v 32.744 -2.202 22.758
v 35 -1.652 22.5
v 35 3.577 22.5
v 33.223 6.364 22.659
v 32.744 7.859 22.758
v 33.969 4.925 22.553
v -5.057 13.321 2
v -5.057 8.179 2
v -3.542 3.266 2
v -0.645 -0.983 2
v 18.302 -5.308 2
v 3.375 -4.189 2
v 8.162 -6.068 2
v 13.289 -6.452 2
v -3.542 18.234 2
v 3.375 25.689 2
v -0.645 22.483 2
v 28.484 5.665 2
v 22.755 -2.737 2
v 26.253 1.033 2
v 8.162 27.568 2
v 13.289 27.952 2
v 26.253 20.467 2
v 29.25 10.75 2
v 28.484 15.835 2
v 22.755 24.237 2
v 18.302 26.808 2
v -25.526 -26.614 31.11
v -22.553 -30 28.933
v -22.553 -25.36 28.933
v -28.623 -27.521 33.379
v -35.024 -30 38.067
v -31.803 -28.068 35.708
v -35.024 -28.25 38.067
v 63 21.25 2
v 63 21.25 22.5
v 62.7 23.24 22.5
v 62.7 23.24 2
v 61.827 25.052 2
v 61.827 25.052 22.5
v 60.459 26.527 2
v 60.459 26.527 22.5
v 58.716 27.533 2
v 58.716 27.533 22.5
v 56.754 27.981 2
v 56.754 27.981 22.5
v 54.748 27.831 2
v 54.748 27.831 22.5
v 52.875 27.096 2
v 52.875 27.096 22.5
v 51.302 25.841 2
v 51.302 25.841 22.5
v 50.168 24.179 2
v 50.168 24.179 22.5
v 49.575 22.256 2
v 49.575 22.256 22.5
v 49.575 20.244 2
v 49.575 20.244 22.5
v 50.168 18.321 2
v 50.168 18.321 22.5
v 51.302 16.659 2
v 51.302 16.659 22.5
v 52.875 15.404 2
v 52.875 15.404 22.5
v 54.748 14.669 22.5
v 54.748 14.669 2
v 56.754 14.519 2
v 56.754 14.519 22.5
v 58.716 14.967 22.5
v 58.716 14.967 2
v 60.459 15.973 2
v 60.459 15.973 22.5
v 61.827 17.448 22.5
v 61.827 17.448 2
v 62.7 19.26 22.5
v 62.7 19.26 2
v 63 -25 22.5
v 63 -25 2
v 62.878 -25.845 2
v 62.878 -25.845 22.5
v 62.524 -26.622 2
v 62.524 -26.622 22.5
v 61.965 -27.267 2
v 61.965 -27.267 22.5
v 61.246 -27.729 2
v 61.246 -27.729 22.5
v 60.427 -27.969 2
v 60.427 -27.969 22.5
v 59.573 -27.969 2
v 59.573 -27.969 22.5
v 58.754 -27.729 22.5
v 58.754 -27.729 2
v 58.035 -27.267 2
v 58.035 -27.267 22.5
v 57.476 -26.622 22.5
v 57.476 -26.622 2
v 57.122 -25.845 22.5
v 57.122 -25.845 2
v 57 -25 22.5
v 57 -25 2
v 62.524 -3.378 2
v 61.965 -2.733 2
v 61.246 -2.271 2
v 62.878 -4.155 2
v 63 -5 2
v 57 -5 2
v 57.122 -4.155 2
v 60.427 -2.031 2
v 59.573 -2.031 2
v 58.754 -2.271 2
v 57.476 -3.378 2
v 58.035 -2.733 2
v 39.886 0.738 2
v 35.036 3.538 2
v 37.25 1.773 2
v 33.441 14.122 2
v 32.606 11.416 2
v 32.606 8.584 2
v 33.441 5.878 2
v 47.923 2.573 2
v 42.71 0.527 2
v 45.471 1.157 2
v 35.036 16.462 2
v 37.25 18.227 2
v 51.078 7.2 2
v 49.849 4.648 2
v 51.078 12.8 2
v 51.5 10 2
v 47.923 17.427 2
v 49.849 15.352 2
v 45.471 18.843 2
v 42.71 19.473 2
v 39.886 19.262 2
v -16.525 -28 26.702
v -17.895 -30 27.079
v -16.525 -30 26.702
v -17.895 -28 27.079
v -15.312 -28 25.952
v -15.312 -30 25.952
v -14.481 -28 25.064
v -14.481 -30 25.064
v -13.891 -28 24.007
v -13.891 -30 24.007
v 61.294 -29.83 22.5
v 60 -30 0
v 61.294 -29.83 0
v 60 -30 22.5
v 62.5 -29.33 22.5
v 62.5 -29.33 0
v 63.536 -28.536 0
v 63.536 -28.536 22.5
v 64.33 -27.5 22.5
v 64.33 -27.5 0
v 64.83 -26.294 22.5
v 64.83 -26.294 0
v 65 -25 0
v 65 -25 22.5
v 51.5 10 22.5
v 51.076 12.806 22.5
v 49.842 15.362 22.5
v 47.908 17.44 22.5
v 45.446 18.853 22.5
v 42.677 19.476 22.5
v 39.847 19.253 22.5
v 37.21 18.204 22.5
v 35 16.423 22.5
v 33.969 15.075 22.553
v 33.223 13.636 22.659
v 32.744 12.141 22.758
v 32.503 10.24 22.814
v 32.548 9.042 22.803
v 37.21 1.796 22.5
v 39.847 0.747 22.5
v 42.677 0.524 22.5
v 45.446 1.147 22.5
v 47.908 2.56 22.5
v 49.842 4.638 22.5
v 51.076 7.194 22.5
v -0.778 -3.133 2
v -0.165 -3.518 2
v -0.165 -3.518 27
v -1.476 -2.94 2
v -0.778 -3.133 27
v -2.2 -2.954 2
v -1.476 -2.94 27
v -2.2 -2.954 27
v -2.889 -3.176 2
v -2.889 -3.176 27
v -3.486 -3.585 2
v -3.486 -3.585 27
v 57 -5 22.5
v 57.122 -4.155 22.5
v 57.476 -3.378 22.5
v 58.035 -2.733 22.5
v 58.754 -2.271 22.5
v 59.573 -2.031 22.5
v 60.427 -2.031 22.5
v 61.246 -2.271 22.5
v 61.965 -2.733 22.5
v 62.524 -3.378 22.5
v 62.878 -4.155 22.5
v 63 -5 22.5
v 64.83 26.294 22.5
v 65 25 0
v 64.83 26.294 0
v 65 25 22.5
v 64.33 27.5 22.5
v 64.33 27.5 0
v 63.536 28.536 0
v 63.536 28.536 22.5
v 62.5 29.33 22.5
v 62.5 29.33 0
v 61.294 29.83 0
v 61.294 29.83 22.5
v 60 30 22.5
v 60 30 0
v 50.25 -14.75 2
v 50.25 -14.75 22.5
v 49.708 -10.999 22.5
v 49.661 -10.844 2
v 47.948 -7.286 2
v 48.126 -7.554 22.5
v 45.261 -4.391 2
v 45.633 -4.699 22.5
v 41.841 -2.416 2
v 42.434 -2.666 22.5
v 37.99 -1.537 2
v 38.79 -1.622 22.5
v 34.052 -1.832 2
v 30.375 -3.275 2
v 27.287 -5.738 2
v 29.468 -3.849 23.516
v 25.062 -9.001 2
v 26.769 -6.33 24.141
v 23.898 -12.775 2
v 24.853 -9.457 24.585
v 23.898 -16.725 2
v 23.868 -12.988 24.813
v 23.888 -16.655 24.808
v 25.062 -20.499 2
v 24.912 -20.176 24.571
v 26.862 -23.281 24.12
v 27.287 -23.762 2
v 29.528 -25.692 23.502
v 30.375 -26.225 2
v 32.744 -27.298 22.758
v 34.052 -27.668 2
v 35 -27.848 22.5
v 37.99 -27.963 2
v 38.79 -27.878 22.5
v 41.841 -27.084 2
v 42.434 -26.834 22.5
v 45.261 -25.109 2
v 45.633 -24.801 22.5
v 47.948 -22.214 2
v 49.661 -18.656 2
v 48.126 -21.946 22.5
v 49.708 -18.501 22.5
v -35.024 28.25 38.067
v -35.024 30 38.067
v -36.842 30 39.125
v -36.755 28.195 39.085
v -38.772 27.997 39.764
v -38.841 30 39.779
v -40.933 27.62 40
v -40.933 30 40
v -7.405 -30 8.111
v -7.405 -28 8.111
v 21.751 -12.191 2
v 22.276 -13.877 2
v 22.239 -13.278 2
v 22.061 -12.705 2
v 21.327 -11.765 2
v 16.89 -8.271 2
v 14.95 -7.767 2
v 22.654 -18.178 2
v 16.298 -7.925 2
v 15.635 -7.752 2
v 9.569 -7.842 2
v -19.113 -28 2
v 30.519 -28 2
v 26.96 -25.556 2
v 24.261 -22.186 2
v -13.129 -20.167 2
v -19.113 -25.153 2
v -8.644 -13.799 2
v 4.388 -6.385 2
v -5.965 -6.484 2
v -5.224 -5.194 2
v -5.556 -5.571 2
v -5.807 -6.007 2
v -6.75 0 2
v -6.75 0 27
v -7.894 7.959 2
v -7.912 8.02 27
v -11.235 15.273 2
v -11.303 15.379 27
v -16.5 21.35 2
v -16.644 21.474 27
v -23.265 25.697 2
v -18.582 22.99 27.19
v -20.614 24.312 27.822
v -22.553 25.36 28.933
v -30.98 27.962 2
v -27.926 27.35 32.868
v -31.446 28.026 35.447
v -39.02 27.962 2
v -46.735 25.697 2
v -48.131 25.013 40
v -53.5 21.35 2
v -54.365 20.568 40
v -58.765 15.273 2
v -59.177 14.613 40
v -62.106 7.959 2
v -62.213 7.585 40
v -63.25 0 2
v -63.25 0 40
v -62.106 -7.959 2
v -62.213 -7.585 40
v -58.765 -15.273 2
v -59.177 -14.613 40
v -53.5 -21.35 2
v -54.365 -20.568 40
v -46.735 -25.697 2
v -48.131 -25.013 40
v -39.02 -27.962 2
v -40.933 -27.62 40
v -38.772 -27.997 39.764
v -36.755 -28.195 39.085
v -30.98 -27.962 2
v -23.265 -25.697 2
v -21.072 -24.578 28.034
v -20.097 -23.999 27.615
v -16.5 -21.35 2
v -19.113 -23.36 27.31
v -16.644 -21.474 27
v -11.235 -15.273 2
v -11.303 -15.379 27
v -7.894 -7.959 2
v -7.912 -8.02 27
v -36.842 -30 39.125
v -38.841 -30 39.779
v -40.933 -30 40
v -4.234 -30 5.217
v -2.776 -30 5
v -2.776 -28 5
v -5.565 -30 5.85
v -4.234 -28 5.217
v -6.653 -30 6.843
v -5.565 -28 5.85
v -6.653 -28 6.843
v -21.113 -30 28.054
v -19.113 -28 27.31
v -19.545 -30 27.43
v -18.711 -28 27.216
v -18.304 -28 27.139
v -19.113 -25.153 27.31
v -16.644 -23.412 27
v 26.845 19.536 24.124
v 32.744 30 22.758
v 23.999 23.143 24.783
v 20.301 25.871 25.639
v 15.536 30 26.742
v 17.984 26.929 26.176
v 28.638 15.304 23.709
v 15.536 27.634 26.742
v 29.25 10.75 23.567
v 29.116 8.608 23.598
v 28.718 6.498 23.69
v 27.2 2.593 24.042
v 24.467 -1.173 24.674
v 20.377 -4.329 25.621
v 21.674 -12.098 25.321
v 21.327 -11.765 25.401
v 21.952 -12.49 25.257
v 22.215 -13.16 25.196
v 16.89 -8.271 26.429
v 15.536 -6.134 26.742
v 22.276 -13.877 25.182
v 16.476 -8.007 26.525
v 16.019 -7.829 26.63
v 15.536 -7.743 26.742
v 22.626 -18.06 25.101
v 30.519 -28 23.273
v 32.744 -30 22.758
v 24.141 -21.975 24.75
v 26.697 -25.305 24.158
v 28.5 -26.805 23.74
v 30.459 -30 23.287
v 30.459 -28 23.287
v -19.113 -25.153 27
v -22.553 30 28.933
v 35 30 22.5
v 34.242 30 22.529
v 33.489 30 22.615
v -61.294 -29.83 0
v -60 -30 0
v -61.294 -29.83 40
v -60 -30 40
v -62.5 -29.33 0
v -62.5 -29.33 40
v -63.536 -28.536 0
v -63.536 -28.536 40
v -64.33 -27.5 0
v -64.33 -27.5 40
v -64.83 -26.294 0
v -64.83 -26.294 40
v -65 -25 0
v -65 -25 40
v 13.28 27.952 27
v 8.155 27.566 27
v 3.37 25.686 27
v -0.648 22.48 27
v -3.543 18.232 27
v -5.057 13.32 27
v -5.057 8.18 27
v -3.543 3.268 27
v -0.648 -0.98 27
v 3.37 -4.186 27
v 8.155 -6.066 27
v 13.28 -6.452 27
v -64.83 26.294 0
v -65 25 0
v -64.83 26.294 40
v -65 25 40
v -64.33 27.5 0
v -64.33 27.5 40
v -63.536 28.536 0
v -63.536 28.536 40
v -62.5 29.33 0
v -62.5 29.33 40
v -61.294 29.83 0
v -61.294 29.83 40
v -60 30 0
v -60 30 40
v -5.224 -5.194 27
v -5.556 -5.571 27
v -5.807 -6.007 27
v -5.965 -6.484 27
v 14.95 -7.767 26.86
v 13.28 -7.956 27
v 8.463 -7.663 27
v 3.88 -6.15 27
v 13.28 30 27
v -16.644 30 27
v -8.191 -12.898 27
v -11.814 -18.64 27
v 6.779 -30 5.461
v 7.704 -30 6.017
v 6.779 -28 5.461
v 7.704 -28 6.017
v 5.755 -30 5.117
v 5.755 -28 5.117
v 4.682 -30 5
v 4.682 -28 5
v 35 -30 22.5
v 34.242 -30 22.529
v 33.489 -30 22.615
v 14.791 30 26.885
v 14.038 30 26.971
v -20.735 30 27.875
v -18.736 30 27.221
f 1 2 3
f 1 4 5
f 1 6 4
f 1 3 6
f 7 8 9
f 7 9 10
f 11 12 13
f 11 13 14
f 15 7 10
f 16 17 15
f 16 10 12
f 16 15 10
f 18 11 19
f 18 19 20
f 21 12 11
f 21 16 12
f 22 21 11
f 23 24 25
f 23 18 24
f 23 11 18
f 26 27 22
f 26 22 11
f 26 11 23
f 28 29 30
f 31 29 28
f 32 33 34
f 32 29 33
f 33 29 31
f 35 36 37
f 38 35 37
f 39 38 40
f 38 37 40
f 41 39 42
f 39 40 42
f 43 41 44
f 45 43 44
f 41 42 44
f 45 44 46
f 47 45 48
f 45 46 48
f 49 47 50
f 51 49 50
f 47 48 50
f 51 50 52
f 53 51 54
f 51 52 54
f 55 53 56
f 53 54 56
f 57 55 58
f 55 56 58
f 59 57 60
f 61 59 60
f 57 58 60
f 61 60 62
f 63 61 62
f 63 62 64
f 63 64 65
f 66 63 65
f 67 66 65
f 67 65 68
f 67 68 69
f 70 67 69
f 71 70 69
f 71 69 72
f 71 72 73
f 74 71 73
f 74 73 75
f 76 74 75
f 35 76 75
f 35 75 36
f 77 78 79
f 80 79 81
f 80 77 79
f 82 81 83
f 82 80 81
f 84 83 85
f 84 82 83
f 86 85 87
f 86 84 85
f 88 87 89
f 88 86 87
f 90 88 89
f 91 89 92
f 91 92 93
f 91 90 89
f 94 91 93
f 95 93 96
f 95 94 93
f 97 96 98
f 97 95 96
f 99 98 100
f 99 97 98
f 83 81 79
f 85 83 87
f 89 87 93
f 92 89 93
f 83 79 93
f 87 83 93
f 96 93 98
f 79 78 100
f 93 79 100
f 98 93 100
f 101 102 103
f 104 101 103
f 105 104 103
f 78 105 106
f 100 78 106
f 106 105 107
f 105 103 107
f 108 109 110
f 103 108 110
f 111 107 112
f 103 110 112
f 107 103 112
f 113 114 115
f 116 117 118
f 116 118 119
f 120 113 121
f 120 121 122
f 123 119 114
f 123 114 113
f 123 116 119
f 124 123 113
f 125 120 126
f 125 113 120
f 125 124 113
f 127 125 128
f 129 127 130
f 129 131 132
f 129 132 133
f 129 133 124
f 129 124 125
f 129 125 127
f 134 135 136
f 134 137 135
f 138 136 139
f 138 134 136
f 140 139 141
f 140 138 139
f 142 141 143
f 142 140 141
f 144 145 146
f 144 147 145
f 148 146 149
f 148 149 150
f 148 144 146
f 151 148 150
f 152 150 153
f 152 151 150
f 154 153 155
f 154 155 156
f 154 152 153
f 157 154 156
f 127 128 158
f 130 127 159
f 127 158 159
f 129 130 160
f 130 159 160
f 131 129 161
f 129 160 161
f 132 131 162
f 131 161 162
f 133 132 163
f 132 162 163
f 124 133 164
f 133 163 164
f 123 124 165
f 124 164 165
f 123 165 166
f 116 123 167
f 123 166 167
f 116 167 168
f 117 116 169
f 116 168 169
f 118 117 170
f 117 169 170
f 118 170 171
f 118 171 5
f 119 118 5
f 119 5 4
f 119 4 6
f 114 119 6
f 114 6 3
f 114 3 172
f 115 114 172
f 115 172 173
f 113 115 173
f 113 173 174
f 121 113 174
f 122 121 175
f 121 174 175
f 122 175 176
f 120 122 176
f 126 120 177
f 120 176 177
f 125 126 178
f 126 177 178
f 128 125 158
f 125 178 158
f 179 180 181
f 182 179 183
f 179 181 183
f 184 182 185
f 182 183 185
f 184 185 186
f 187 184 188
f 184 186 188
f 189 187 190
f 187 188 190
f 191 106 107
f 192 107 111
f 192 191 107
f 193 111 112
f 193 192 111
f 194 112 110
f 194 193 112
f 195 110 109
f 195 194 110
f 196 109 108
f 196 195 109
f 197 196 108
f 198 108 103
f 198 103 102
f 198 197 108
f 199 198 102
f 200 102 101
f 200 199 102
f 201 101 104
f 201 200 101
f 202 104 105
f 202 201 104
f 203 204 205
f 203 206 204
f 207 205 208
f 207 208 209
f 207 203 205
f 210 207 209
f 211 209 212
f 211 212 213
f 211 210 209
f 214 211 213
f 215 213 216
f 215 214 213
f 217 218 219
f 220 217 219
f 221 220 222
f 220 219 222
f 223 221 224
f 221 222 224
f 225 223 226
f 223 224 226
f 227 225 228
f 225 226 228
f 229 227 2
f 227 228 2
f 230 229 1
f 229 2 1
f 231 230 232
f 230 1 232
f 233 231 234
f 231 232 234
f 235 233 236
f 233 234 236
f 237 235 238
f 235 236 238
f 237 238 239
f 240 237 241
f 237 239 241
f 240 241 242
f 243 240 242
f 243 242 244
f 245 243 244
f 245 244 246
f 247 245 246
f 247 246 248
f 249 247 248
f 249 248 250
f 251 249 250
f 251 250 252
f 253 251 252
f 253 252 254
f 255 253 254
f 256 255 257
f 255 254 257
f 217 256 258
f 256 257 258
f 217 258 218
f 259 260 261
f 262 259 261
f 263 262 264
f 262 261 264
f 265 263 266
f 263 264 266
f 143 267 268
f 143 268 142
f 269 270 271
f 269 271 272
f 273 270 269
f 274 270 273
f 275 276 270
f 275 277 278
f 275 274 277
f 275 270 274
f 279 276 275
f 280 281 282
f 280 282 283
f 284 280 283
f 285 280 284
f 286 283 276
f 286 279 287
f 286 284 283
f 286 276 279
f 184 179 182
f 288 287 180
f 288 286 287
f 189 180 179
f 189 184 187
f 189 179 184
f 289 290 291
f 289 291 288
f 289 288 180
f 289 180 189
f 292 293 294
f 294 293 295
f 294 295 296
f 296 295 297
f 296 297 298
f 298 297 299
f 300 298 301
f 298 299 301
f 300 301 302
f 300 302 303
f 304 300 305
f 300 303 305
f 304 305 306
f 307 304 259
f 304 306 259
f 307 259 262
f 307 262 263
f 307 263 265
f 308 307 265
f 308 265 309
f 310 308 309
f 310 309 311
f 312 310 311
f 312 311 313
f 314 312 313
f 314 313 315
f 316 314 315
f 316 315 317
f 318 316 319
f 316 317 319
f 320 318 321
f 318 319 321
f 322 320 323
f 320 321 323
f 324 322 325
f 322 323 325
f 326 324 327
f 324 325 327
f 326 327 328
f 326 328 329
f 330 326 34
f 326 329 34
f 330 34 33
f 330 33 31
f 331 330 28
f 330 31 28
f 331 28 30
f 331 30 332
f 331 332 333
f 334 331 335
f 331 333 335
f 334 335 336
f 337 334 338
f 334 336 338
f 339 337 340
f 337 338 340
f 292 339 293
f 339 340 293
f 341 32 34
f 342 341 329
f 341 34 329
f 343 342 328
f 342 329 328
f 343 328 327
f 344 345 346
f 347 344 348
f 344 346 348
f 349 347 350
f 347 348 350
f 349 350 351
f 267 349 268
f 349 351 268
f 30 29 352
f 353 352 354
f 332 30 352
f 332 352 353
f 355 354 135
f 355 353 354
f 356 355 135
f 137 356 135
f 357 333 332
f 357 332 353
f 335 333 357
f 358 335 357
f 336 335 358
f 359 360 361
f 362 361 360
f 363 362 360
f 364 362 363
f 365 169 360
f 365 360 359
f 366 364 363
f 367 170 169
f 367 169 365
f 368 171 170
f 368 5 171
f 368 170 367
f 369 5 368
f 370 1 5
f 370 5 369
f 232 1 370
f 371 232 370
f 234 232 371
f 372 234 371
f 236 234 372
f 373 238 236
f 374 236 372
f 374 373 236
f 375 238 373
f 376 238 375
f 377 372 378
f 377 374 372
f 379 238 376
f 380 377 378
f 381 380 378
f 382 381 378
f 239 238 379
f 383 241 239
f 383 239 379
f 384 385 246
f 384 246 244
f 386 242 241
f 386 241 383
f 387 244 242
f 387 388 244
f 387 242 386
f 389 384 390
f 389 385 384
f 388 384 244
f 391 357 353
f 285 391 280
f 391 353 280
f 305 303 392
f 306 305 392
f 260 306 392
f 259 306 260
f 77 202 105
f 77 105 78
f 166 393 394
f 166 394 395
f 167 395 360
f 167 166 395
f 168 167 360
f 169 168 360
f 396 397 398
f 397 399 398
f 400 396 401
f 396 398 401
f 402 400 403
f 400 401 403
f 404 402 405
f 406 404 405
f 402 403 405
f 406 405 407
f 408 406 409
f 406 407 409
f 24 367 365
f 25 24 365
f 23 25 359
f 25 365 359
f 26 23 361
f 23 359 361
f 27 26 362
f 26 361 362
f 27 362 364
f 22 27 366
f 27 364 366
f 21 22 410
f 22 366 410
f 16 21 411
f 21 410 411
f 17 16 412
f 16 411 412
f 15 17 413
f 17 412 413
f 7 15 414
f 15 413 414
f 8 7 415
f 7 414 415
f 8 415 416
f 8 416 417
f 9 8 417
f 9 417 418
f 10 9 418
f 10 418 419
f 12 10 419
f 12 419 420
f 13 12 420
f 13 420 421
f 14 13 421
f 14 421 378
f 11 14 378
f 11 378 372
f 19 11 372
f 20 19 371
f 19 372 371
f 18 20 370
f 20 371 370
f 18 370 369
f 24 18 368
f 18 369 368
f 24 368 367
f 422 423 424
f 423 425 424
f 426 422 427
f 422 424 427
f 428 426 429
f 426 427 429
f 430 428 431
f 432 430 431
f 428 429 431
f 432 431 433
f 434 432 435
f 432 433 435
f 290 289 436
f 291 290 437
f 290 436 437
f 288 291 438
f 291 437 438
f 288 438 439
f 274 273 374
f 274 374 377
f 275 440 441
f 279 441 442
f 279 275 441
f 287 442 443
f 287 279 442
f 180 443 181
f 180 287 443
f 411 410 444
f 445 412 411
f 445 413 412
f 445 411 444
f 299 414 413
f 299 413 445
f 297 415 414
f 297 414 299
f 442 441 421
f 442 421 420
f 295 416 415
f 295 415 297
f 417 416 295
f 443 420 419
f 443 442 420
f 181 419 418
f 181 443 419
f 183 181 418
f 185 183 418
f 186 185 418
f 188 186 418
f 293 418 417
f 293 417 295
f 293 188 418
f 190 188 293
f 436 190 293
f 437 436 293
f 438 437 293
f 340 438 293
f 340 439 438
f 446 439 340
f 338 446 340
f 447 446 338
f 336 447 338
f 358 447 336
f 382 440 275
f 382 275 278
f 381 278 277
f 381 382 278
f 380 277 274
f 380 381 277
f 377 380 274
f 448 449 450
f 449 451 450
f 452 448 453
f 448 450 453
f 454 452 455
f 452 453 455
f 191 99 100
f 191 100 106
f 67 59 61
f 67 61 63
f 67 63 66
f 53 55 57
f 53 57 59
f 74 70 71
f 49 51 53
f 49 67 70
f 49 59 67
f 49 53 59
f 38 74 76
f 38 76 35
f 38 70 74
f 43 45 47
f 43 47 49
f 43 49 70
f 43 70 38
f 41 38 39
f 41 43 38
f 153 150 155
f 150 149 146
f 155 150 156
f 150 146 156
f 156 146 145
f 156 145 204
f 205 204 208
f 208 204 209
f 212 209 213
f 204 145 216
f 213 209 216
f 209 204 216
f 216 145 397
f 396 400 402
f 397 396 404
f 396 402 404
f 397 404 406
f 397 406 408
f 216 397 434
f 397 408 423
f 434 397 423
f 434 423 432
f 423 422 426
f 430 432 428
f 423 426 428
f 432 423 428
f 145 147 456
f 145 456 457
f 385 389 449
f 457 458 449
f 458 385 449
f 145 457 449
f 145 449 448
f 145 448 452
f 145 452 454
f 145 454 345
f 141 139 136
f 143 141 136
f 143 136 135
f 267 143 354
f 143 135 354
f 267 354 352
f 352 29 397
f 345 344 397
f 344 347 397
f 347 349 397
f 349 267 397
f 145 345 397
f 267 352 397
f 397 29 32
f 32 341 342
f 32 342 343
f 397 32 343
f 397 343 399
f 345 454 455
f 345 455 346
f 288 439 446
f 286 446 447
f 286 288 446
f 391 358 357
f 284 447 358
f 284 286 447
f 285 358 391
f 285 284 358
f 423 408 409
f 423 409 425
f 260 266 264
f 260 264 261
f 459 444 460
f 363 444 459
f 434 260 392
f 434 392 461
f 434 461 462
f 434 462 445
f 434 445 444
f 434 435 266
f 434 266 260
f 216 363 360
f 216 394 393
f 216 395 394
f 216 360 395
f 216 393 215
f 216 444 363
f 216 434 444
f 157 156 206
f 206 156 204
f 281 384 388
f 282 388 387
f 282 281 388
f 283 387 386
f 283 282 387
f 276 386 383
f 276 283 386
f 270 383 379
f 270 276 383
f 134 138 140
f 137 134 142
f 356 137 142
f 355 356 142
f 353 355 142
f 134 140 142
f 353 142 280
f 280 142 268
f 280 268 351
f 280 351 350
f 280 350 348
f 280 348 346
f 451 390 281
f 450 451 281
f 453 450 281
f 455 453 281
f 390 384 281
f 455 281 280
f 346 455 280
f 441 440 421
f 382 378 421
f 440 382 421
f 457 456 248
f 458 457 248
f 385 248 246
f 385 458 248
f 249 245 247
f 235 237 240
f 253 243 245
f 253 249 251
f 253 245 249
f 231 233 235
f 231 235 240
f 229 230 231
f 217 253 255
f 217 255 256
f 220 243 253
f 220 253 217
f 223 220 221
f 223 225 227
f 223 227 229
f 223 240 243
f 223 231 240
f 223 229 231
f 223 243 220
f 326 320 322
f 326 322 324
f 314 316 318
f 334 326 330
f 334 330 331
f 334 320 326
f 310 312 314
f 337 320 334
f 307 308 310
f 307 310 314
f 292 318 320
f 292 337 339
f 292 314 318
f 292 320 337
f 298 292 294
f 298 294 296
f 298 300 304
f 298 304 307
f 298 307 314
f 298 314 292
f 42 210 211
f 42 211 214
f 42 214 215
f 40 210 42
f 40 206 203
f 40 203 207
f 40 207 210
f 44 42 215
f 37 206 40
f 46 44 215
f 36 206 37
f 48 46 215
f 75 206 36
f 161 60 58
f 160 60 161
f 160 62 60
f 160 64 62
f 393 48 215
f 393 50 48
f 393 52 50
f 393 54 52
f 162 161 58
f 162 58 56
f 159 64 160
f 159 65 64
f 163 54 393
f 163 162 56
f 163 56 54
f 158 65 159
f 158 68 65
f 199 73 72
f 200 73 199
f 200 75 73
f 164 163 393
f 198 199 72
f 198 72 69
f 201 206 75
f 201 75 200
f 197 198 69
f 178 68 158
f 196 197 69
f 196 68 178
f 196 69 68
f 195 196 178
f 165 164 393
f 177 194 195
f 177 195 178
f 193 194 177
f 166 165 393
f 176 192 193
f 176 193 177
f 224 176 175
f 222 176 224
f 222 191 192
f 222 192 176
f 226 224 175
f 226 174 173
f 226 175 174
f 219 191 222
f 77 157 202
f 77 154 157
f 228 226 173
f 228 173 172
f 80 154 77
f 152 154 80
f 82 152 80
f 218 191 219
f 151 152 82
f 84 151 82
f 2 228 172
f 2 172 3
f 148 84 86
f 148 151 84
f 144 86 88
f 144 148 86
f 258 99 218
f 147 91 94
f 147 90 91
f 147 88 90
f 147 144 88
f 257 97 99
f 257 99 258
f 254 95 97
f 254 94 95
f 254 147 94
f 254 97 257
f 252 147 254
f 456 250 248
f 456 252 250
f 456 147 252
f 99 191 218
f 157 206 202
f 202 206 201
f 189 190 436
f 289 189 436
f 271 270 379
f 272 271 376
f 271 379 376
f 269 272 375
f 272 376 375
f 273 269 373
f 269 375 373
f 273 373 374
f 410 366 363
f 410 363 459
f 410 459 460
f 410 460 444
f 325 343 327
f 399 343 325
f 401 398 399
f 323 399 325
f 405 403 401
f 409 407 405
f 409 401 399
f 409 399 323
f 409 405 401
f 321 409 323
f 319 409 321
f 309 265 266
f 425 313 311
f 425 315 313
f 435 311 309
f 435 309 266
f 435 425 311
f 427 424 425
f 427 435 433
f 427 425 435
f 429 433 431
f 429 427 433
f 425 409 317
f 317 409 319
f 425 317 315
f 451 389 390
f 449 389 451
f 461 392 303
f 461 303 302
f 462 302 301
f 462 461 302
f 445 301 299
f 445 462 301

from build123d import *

# Parameters (mm, degrees)
SKETCH1_W               = 60
SKETCH1_H               = 130
BOSS_EXTRUDE1_DEPTH     = 40
SKETCH2_R               = 28.25
SKETCH2_R_2             = 13.25
SKETCH2_R_3             = 17.25
SKETCH2_R_4             = 6.75
SKETCH2_R_5             = 9.5
CUT_EXTRUDE1_DEPTH      = 38
CUT_EXTRUDE9_DEPTH      = 83.006097334
CUT_EXTRUDE9_DEPTH_BACK = 83.006097334
CUT_EXTRUDE10_START     = 2
CUT_EXTRUDE10_DEPTH     = 81.006097334
CUT_EXTRUDE11_REACH     = 99.082
FILLET8_R               = 5
FILLET9_R               = 10
FILLET10_R              = 2.5
FILLET11_R              = 5


with BuildPart() as part:
    # Sketch1 → Boss-Extrude1 (new body)
    with BuildSketch(Plane(origin=(0, 0, 0), x_dir=(0, 1, 0), z_dir=(0, 0, 1))):
        Rectangle(SKETCH1_W, SKETCH1_H)
    extrude(amount=BOSS_EXTRUDE1_DEPTH)

    # Sketch2 → Cut-Extrude1 (cut)
    with BuildSketch(Plane.XY.offset(40)):
        with Locations((-35, 0)):
            Circle(SKETCH2_R)
        with Locations((37, -14.75)):
            Circle(SKETCH2_R_2)
        with Locations((12, 10.75)):
            Circle(SKETCH2_R_3)
        with Locations((56.25, 21.25)):
            Circle(SKETCH2_R_4)
        with Locations((42, 10)):
            Circle(SKETCH2_R_5)
        with BuildLine():
            Line((63, -5), (63, -25))
            ThreePointArc((63, -25), (60, -28), (57, -25))
            Line((57, -25), (57, -5))
            ThreePointArc((57, -5), (60, -2), (63, -5))
        make_face()
    extrude(amount=-CUT_EXTRUDE1_DEPTH, mode=Mode.SUBTRACT)

    # Sketch11 → Cut-Extrude9 (cut, two sides: drawn at the far end of the back side and taken through both)
    with BuildSketch(Plane(origin=(0, 0, 0), x_dir=(-1, 0, 0), z_dir=(0, 1, 0)).offset(-CUT_EXTRUDE9_DEPTH_BACK)):
        Polygon((37.662617959, 40), (-65, 40), (-65, 22.5), (-33.857500095, 22.5), (-14.42300462, 27), (19.914447088, 27), align=None)
    extrude(amount=CUT_EXTRUDE9_DEPTH + CUT_EXTRUDE9_DEPTH_BACK, mode=Mode.SUBTRACT)

    # Sketch12 → Cut-Extrude10 (cut, through all)
    with BuildSketch(Plane(origin=(0, 0, 0), x_dir=(0, 1, 0), z_dir=(0, 0, 1)).offset(CUT_EXTRUDE10_START)):
        with BuildLine():
            Line((-25.153127982, 19.113444278), (-28, 19.113444278))
            Line((-28, 19.113444278), (-28, -14.42300462))
            Line((-28, -14.42300462), (-28, -30.519259302))
            ThreePointArc((-28, -30.519259302), (-21.630520462, -23.953125349), (-12.614481333, -22.405409906))
            Line((-12.614481333, -22.405409906), (-7.568879853, -15.997641924))
            ThreePointArc((-7.568879853, -15.997641924), (-7.137176738, -6.377597635), (-1.98737408, 1.759425917))
            Line((-1.98737408, 1.759425917), (-5.735279815, 5.808065062))
            ThreePointArc((-5.735279815, 5.808065062), (-16.816114685, 10.458590364), (-25.153127982, 19.113444278))
        make_face()
    extrude(amount=CUT_EXTRUDE10_DEPTH, mode=Mode.SUBTRACT)

    # Sketch13 → Cut-Extrude11 (cut, up to next)
    with BuildSketch(Plane.XZ.offset(30), mode=Mode.PRIVATE) as cut_extrude11_sk1:
        Polygon((-15.112535459, 27), (35.351266766, 27), (6.364131369, 5), (-6.135868631, 5), align=None)
    cut_extrude11_tool1 = extrude(cut_extrude11_sk1.sketch, amount=-CUT_EXTRUDE11_REACH, mode=Mode.PRIVATE) & part.part
    add(cut_extrude11_tool1.solids().sort_by_distance((6.122185, -30, 18.210804))[0], mode=Mode.SUBTRACT)

    # Fillet8
    fillet8_edges = [part.edges().sort_by_distance(p)[0] for p in [
        (65, 30, 11.25),
        (65, -30, 11.25),
        (-65, -30, 20),
        (-65, 30, 20),
    ]]
    fillet(fillet8_edges, radius=FILLET8_R)

    # Fillet9
    # the kernel refuses this fillet: 10 mm, written as the material it adds along each edge
    with BuildSketch(Plane(origin=(33.857500095, -30, 22.5), x_dir=(1, 0, 0), z_dir=(0, 1, 0))) as fillet9_piece_1_section:
        with BuildLine():
            CenterArc((FILLET9_R * 0.114262005899, -FILLET9_R), FILLET9_R, 90, 13.036921742)
            Line((-FILLET9_R * 0.111316891577, -FILLET9_R * 0.0257750973141), (0, 0))
            Line((0, 0), (FILLET9_R * 0.114262005899, 0))
        make_face()
    fillet9_piece_1 = extrude(amount=5.234596359, mode=Mode.PRIVATE)
    fillet9_piece_1 = fillet9_piece_1 - Plane(origin=(37, -14.75, 22.477974756), x_dir=(1, 0, 0), z_dir=(0, 0, 1)) * Cylinder(13.25, 16, mode=Mode.PRIVATE)
    add(fillet9_piece_1)
    with BuildSketch(Plane(origin=(33.857500095, -4.734596359, 22.5), x_dir=(1, 0, 0), z_dir=(0, 1, 0))) as fillet9_piece_2_section:
        with BuildLine():
            CenterArc((FILLET9_R * 0.114262005899, -FILLET9_R), FILLET9_R, 90, 13.036921742)
            Line((-FILLET9_R * 0.111316891577, -FILLET9_R * 0.0257750973141), (0, 0))
            Line((0, 0), (FILLET9_R * 0.114262005899, 0))
        make_face()
    fillet9_piece_2 = extrude(amount=12.697303917, mode=Mode.PRIVATE)
    fillet9_piece_2 = fillet9_piece_2 - Plane(origin=(37, -14.75, 22.48681781), x_dir=(1, 0, 0), z_dir=(0, 0, 1)) * Cylinder(13.25, 30, mode=Mode.PRIVATE)
    fillet9_piece_2 = fillet9_piece_2 - Plane(origin=(42, 10, 22.48681781), x_dir=(1, 0, 0), z_dir=(0, 0, 1)) * Cylinder(9.5, 30, mode=Mode.PRIVATE)
    add(fillet9_piece_2)
    with BuildSketch(Plane(origin=(33.857500095, 12.037292442, 22.5), x_dir=(1, 0, 0), z_dir=(0, 1, 0))) as fillet9_piece_3_section:
        with BuildLine():
            CenterArc((FILLET9_R * 0.114262005899, -FILLET9_R), FILLET9_R, 90, 13.036921742)
            Line((-FILLET9_R * 0.111316891577, -FILLET9_R * 0.0257750973141), (0, 0))
            Line((0, 0), (FILLET9_R * 0.114262005899, 0))
        make_face()
    fillet9_piece_3 = extrude(amount=17.962707558, mode=Mode.PRIVATE)
    fillet9_piece_3 = fillet9_piece_3 - Plane(origin=(42, 10, 22.478816229), x_dir=(1, 0, 0), z_dir=(0, 0, 1)) * Cylinder(9.5, 41, mode=Mode.PRIVATE)
    add(fillet9_piece_3)
    with BuildSketch(Plane(origin=(-19.914447088, -15.708414802, 27), x_dir=(1, 0, 0), z_dir=(0, -1, 0))) as fillet9_piece_4_section:
        with BuildLine():
            CenterArc((FILLET9_R * 0.327059529607, FILLET9_R), FILLET9_R, 233.778347997, 36.221652003)
            Line((-FILLET9_R * 0.263851045123, FILLET9_R * 0.193262934611), (0, 0))
            Line((0, 0), (FILLET9_R * 0.327059529607, 0))
        make_face()
    fillet9_piece_4 = extrude(amount=14.291585198, mode=Mode.PRIVATE)
    fillet9_piece_4 = fillet9_piece_4 & Plane(origin=(-35, 0, 26.964300655), x_dir=(0.9812415105326922, -0.19278251478679478, 0), z_dir=(0, 0, -1)) * Cylinder(29.75, 42, mode=Mode.PRIVATE)
    fillet9_piece_4 = split(fillet9_piece_4, bisect_by=Plane(origin=(-19.113444278, -23.524724426, 26.964300655), z_dir=(1, 0, 0)), keep=Keep.TOP, mode=Mode.PRIVATE)
    fillet9_piece_4 = fillet9_piece_4 - Plane(origin=(-35, 0, 26.964300655), x_dir=(1, 0, 0), z_dir=(0, 0, 1)) * Cylinder(28.25, 42, mode=Mode.PRIVATE)
    add(fillet9_piece_4)
    with BuildSketch(Plane(origin=(-19.914447088, -15.708414802, 27), x_dir=(1, 0, 0), z_dir=(0, -1, 0))) as fillet9_piece_5_section:
        with BuildLine():
            CenterArc((FILLET9_R * 0.327059529607, FILLET9_R), FILLET9_R, 233.778347997, 36.221652003)
            Line((-FILLET9_R * 0.263851045123, FILLET9_R * 0.193262934611), (0, 0))
            Line((0, 0), (FILLET9_R * 0.327059529607, 0))
        make_face()
    fillet9_piece_5 = extrude(amount=14.291585198, mode=Mode.PRIVATE)
    fillet9_piece_5 = fillet9_piece_5 & Plane(origin=(-35, 0, 27.570308722), x_dir=(0.9812415105326922, -0.19278251478679478, 0), z_dir=(0, 0, -1)) * Cylinder(29.75, 42, mode=Mode.PRIVATE)
    fillet9_piece_5 = split(fillet9_piece_5, bisect_by=Plane(origin=(-19.113444278, -25.104682391, 27.570308722), z_dir=(-1, 0, 0)), keep=Keep.TOP, mode=Mode.PRIVATE)
    fillet9_piece_5 = fillet9_piece_5 - Plane(origin=(-35, 0, 27.570308722), x_dir=(1, 0, 0), z_dir=(0, 0, 1)) * Cylinder(28.25, 42, mode=Mode.PRIVATE)
    add(fillet9_piece_5)
    with BuildSketch(Plane(origin=(-19.914447088, -15.708414802, 27), x_dir=(1, 0, 0), z_dir=(0, -1, 0))) as fillet9_piece_6_section:
        with BuildLine():
            CenterArc((FILLET9_R * 0.327059529607, FILLET9_R), FILLET9_R, 233.778347997, 36.221652003)
            Line((-FILLET9_R * 0.263851045123, FILLET9_R * 0.193262934611), (0, 0))
            Line((0, 0), (FILLET9_R * 0.327059529607, 0))
        make_face()
    fillet9_piece_6 = extrude(amount=14.291585198, mode=Mode.PRIVATE)
    fillet9_piece_6 = fillet9_piece_6 - Plane(origin=(-35, 0, 27.459351012), x_dir=(0.9812415105326922, -0.19278251478679478, 0), z_dir=(0, 0, -1)) * Cylinder(29.75, 42, mode=Mode.PRIVATE)
    fillet9_piece_6 = split(fillet9_piece_6, bisect_by=Plane(origin=(-19.113444278, -26.928061773, 27.459351012), z_dir=(-1, 0, 0)), keep=Keep.TOP, mode=Mode.PRIVATE)
    fillet9_piece_6 = split(fillet9_piece_6, bisect_by=Plane(origin=(-20.316684316, -28, 27.459351012), z_dir=(0, 1, 0)), keep=Keep.TOP, mode=Mode.PRIVATE)
    add(fillet9_piece_6)
    with BuildSketch(Plane(origin=(-19.914447088, -15.708414802, 27), x_dir=(1, 0, 0), z_dir=(0, -1, 0))) as fillet9_piece_7_section:
        with BuildLine():
            CenterArc((FILLET9_R * 0.327059529607, FILLET9_R), FILLET9_R, 233.778347997, 36.221652003)
            Line((-FILLET9_R * 0.263851045123, FILLET9_R * 0.193262934611), (0, 0))
            Line((0, 0), (FILLET9_R * 0.327059529607, 0))
        make_face()
    fillet9_piece_7 = extrude(amount=14.291585198, mode=Mode.PRIVATE)
    fillet9_piece_7 = split(fillet9_piece_7, bisect_by=Plane(origin=(-19.113444278, -29, 26.965326642), z_dir=(1, 0, 0)), keep=Keep.TOP, mode=Mode.PRIVATE)
    fillet9_piece_7 = split(fillet9_piece_7, bisect_by=Plane(origin=(-18.088636338, -28, 26.965326642), z_dir=(0, -1, 0)), keep=Keep.TOP, mode=Mode.PRIVATE)
    add(fillet9_piece_7)
    with BuildSketch(Plane(origin=(-19.914447088, -15.708414802, 27), x_dir=(1, 0, 0), z_dir=(0, -1, 0))) as fillet9_piece_8_section:
        with BuildLine():
            CenterArc((FILLET9_R * 0.327059529607, FILLET9_R), FILLET9_R, 233.778347997, 36.221652003)
            Line((-FILLET9_R * 0.263851045123, FILLET9_R * 0.193262934611), (0, 0))
            Line((0, 0), (FILLET9_R * 0.327059529607, 0))
        make_face()
    fillet9_piece_8 = extrude(amount=14.291585198, mode=Mode.PRIVATE)
    fillet9_piece_8 = split(fillet9_piece_8, bisect_by=Plane(origin=(-19.113444278, -29, 27.580257853), z_dir=(-1, 0, 0)), keep=Keep.TOP, mode=Mode.PRIVATE)
    fillet9_piece_8 = split(fillet9_piece_8, bisect_by=Plane(origin=(-20.54645477, -28, 27.580257853), z_dir=(0, -1, 0)), keep=Keep.TOP, mode=Mode.PRIVATE)
    add(fillet9_piece_8)
    with BuildSketch(Plane(origin=(-19.914447088, 30, 27), x_dir=(-0.8067370653888534, 0, 0.5909105747300355), z_dir=(0, -1, 0))) as fillet9_piece_9_section:
        with BuildLine():
            CenterArc((FILLET9_R * 0.327059529607, -FILLET9_R), FILLET9_R, 90, 36.221652003)
            Line((-FILLET9_R * 0.263851045123, -FILLET9_R * 0.193262934611), (0, 0))
            Line((0, 0), (FILLET9_R * 0.327059529607, 0))
        make_face()
    fillet9_piece_9 = extrude(amount=14.291585198, mode=Mode.PRIVATE)
    fillet9_piece_9 = fillet9_piece_9 - Plane(origin=(-35, 0, 27.325753935), x_dir=(1, 0, 0), z_dir=(0, 0, 1)) * Cylinder(28.25, 42, mode=Mode.PRIVATE)
    add(fillet9_piece_9)
    # the kernel refuses this fillet: 10 mm, written as the material it takes off along each edge
    with BuildSketch(Plane(origin=(14.42300462, 32.856550147, 27), x_dir=(0.9742249026859169, 0, -0.22557889747628432), z_dir=(0, -1, 0))) as fillet9_2_piece_1:
        with BuildLine():
            CenterArc((FILLET9_R * 0.114262005899, -FILLET9_R), FILLET9_R, 90, 13.036921742)
            Line((-FILLET9_R * 0.111316891577, -FILLET9_R * 0.0257750973141), (0, 0))
            Line((0, 0), (FILLET9_R * 0.114262005899, 0))
        make_face()
    extrude(amount=7.884120565, mode=Mode.SUBTRACT)
    with BuildSketch(Plane(origin=(14.42300462, -3.472429582, 27), x_dir=(0.9742249026859169, 0, -0.22557889747628432), z_dir=(0, -1, 0))) as fillet9_2_piece_2:
        with BuildLine():
            CenterArc((FILLET9_R * 0.114262005899, -FILLET9_R), FILLET9_R, 90, 13.036921742)
            Line((-FILLET9_R * 0.111316891577, -FILLET9_R * 0.0257750973141), (0, 0))
            Line((0, 0), (FILLET9_R * 0.114262005899, 0))
        make_face()
    extrude(amount=7.226902729, mode=Mode.SUBTRACT)
    with BuildSketch(Plane(origin=(-37.662617959, 38.17648824, 40), x_dir=(0.8067370653888553, 0, -0.5909105747300331), z_dir=(0, -1, 0)), Plane(origin=(-37.662617959, -19.94775336, 40), x_dir=(0.8067370653888553, 0, -0.5909105747300331), z_dir=(0, -1, 0))) as fillet9_2_piece_3:
        with BuildLine():
            CenterArc((FILLET9_R * 0.327059529607, -FILLET9_R), FILLET9_R, 90, 36.221652003)
            Line((-FILLET9_R * 0.263851045123, -FILLET9_R * 0.193262934611), (0, 0))
            Line((0, 0), (FILLET9_R * 0.327059529607, 0))
        make_face()
    extrude(amount=18.22873488, mode=Mode.SUBTRACT)

    # Fillet10
    fillet10_edges = [part.edges().sort_by_distance(p)[0] for p in [
        (22.405409906, -12.614481333, 13.575848822),
        (15.997641924, -7.568879853, 14.317698693),
        (-1.759425917, -1.98737408, 14.5),
        (-5.808065062, -5.735279815, 14.5),
    ]]
    fillet(fillet10_edges, radius=FILLET10_R)

    # Fillet11
    fillet11_edges = [part.edges().sort_by_distance(p)[0] for p in [
        (6.364131369, -29, 5),
        (-6.135868631, -29, 5),
        (-15.112535459, -29, 27),
    ]]
    fillet(fillet11_edges, radius=FILLET11_R)


solid = part.part
